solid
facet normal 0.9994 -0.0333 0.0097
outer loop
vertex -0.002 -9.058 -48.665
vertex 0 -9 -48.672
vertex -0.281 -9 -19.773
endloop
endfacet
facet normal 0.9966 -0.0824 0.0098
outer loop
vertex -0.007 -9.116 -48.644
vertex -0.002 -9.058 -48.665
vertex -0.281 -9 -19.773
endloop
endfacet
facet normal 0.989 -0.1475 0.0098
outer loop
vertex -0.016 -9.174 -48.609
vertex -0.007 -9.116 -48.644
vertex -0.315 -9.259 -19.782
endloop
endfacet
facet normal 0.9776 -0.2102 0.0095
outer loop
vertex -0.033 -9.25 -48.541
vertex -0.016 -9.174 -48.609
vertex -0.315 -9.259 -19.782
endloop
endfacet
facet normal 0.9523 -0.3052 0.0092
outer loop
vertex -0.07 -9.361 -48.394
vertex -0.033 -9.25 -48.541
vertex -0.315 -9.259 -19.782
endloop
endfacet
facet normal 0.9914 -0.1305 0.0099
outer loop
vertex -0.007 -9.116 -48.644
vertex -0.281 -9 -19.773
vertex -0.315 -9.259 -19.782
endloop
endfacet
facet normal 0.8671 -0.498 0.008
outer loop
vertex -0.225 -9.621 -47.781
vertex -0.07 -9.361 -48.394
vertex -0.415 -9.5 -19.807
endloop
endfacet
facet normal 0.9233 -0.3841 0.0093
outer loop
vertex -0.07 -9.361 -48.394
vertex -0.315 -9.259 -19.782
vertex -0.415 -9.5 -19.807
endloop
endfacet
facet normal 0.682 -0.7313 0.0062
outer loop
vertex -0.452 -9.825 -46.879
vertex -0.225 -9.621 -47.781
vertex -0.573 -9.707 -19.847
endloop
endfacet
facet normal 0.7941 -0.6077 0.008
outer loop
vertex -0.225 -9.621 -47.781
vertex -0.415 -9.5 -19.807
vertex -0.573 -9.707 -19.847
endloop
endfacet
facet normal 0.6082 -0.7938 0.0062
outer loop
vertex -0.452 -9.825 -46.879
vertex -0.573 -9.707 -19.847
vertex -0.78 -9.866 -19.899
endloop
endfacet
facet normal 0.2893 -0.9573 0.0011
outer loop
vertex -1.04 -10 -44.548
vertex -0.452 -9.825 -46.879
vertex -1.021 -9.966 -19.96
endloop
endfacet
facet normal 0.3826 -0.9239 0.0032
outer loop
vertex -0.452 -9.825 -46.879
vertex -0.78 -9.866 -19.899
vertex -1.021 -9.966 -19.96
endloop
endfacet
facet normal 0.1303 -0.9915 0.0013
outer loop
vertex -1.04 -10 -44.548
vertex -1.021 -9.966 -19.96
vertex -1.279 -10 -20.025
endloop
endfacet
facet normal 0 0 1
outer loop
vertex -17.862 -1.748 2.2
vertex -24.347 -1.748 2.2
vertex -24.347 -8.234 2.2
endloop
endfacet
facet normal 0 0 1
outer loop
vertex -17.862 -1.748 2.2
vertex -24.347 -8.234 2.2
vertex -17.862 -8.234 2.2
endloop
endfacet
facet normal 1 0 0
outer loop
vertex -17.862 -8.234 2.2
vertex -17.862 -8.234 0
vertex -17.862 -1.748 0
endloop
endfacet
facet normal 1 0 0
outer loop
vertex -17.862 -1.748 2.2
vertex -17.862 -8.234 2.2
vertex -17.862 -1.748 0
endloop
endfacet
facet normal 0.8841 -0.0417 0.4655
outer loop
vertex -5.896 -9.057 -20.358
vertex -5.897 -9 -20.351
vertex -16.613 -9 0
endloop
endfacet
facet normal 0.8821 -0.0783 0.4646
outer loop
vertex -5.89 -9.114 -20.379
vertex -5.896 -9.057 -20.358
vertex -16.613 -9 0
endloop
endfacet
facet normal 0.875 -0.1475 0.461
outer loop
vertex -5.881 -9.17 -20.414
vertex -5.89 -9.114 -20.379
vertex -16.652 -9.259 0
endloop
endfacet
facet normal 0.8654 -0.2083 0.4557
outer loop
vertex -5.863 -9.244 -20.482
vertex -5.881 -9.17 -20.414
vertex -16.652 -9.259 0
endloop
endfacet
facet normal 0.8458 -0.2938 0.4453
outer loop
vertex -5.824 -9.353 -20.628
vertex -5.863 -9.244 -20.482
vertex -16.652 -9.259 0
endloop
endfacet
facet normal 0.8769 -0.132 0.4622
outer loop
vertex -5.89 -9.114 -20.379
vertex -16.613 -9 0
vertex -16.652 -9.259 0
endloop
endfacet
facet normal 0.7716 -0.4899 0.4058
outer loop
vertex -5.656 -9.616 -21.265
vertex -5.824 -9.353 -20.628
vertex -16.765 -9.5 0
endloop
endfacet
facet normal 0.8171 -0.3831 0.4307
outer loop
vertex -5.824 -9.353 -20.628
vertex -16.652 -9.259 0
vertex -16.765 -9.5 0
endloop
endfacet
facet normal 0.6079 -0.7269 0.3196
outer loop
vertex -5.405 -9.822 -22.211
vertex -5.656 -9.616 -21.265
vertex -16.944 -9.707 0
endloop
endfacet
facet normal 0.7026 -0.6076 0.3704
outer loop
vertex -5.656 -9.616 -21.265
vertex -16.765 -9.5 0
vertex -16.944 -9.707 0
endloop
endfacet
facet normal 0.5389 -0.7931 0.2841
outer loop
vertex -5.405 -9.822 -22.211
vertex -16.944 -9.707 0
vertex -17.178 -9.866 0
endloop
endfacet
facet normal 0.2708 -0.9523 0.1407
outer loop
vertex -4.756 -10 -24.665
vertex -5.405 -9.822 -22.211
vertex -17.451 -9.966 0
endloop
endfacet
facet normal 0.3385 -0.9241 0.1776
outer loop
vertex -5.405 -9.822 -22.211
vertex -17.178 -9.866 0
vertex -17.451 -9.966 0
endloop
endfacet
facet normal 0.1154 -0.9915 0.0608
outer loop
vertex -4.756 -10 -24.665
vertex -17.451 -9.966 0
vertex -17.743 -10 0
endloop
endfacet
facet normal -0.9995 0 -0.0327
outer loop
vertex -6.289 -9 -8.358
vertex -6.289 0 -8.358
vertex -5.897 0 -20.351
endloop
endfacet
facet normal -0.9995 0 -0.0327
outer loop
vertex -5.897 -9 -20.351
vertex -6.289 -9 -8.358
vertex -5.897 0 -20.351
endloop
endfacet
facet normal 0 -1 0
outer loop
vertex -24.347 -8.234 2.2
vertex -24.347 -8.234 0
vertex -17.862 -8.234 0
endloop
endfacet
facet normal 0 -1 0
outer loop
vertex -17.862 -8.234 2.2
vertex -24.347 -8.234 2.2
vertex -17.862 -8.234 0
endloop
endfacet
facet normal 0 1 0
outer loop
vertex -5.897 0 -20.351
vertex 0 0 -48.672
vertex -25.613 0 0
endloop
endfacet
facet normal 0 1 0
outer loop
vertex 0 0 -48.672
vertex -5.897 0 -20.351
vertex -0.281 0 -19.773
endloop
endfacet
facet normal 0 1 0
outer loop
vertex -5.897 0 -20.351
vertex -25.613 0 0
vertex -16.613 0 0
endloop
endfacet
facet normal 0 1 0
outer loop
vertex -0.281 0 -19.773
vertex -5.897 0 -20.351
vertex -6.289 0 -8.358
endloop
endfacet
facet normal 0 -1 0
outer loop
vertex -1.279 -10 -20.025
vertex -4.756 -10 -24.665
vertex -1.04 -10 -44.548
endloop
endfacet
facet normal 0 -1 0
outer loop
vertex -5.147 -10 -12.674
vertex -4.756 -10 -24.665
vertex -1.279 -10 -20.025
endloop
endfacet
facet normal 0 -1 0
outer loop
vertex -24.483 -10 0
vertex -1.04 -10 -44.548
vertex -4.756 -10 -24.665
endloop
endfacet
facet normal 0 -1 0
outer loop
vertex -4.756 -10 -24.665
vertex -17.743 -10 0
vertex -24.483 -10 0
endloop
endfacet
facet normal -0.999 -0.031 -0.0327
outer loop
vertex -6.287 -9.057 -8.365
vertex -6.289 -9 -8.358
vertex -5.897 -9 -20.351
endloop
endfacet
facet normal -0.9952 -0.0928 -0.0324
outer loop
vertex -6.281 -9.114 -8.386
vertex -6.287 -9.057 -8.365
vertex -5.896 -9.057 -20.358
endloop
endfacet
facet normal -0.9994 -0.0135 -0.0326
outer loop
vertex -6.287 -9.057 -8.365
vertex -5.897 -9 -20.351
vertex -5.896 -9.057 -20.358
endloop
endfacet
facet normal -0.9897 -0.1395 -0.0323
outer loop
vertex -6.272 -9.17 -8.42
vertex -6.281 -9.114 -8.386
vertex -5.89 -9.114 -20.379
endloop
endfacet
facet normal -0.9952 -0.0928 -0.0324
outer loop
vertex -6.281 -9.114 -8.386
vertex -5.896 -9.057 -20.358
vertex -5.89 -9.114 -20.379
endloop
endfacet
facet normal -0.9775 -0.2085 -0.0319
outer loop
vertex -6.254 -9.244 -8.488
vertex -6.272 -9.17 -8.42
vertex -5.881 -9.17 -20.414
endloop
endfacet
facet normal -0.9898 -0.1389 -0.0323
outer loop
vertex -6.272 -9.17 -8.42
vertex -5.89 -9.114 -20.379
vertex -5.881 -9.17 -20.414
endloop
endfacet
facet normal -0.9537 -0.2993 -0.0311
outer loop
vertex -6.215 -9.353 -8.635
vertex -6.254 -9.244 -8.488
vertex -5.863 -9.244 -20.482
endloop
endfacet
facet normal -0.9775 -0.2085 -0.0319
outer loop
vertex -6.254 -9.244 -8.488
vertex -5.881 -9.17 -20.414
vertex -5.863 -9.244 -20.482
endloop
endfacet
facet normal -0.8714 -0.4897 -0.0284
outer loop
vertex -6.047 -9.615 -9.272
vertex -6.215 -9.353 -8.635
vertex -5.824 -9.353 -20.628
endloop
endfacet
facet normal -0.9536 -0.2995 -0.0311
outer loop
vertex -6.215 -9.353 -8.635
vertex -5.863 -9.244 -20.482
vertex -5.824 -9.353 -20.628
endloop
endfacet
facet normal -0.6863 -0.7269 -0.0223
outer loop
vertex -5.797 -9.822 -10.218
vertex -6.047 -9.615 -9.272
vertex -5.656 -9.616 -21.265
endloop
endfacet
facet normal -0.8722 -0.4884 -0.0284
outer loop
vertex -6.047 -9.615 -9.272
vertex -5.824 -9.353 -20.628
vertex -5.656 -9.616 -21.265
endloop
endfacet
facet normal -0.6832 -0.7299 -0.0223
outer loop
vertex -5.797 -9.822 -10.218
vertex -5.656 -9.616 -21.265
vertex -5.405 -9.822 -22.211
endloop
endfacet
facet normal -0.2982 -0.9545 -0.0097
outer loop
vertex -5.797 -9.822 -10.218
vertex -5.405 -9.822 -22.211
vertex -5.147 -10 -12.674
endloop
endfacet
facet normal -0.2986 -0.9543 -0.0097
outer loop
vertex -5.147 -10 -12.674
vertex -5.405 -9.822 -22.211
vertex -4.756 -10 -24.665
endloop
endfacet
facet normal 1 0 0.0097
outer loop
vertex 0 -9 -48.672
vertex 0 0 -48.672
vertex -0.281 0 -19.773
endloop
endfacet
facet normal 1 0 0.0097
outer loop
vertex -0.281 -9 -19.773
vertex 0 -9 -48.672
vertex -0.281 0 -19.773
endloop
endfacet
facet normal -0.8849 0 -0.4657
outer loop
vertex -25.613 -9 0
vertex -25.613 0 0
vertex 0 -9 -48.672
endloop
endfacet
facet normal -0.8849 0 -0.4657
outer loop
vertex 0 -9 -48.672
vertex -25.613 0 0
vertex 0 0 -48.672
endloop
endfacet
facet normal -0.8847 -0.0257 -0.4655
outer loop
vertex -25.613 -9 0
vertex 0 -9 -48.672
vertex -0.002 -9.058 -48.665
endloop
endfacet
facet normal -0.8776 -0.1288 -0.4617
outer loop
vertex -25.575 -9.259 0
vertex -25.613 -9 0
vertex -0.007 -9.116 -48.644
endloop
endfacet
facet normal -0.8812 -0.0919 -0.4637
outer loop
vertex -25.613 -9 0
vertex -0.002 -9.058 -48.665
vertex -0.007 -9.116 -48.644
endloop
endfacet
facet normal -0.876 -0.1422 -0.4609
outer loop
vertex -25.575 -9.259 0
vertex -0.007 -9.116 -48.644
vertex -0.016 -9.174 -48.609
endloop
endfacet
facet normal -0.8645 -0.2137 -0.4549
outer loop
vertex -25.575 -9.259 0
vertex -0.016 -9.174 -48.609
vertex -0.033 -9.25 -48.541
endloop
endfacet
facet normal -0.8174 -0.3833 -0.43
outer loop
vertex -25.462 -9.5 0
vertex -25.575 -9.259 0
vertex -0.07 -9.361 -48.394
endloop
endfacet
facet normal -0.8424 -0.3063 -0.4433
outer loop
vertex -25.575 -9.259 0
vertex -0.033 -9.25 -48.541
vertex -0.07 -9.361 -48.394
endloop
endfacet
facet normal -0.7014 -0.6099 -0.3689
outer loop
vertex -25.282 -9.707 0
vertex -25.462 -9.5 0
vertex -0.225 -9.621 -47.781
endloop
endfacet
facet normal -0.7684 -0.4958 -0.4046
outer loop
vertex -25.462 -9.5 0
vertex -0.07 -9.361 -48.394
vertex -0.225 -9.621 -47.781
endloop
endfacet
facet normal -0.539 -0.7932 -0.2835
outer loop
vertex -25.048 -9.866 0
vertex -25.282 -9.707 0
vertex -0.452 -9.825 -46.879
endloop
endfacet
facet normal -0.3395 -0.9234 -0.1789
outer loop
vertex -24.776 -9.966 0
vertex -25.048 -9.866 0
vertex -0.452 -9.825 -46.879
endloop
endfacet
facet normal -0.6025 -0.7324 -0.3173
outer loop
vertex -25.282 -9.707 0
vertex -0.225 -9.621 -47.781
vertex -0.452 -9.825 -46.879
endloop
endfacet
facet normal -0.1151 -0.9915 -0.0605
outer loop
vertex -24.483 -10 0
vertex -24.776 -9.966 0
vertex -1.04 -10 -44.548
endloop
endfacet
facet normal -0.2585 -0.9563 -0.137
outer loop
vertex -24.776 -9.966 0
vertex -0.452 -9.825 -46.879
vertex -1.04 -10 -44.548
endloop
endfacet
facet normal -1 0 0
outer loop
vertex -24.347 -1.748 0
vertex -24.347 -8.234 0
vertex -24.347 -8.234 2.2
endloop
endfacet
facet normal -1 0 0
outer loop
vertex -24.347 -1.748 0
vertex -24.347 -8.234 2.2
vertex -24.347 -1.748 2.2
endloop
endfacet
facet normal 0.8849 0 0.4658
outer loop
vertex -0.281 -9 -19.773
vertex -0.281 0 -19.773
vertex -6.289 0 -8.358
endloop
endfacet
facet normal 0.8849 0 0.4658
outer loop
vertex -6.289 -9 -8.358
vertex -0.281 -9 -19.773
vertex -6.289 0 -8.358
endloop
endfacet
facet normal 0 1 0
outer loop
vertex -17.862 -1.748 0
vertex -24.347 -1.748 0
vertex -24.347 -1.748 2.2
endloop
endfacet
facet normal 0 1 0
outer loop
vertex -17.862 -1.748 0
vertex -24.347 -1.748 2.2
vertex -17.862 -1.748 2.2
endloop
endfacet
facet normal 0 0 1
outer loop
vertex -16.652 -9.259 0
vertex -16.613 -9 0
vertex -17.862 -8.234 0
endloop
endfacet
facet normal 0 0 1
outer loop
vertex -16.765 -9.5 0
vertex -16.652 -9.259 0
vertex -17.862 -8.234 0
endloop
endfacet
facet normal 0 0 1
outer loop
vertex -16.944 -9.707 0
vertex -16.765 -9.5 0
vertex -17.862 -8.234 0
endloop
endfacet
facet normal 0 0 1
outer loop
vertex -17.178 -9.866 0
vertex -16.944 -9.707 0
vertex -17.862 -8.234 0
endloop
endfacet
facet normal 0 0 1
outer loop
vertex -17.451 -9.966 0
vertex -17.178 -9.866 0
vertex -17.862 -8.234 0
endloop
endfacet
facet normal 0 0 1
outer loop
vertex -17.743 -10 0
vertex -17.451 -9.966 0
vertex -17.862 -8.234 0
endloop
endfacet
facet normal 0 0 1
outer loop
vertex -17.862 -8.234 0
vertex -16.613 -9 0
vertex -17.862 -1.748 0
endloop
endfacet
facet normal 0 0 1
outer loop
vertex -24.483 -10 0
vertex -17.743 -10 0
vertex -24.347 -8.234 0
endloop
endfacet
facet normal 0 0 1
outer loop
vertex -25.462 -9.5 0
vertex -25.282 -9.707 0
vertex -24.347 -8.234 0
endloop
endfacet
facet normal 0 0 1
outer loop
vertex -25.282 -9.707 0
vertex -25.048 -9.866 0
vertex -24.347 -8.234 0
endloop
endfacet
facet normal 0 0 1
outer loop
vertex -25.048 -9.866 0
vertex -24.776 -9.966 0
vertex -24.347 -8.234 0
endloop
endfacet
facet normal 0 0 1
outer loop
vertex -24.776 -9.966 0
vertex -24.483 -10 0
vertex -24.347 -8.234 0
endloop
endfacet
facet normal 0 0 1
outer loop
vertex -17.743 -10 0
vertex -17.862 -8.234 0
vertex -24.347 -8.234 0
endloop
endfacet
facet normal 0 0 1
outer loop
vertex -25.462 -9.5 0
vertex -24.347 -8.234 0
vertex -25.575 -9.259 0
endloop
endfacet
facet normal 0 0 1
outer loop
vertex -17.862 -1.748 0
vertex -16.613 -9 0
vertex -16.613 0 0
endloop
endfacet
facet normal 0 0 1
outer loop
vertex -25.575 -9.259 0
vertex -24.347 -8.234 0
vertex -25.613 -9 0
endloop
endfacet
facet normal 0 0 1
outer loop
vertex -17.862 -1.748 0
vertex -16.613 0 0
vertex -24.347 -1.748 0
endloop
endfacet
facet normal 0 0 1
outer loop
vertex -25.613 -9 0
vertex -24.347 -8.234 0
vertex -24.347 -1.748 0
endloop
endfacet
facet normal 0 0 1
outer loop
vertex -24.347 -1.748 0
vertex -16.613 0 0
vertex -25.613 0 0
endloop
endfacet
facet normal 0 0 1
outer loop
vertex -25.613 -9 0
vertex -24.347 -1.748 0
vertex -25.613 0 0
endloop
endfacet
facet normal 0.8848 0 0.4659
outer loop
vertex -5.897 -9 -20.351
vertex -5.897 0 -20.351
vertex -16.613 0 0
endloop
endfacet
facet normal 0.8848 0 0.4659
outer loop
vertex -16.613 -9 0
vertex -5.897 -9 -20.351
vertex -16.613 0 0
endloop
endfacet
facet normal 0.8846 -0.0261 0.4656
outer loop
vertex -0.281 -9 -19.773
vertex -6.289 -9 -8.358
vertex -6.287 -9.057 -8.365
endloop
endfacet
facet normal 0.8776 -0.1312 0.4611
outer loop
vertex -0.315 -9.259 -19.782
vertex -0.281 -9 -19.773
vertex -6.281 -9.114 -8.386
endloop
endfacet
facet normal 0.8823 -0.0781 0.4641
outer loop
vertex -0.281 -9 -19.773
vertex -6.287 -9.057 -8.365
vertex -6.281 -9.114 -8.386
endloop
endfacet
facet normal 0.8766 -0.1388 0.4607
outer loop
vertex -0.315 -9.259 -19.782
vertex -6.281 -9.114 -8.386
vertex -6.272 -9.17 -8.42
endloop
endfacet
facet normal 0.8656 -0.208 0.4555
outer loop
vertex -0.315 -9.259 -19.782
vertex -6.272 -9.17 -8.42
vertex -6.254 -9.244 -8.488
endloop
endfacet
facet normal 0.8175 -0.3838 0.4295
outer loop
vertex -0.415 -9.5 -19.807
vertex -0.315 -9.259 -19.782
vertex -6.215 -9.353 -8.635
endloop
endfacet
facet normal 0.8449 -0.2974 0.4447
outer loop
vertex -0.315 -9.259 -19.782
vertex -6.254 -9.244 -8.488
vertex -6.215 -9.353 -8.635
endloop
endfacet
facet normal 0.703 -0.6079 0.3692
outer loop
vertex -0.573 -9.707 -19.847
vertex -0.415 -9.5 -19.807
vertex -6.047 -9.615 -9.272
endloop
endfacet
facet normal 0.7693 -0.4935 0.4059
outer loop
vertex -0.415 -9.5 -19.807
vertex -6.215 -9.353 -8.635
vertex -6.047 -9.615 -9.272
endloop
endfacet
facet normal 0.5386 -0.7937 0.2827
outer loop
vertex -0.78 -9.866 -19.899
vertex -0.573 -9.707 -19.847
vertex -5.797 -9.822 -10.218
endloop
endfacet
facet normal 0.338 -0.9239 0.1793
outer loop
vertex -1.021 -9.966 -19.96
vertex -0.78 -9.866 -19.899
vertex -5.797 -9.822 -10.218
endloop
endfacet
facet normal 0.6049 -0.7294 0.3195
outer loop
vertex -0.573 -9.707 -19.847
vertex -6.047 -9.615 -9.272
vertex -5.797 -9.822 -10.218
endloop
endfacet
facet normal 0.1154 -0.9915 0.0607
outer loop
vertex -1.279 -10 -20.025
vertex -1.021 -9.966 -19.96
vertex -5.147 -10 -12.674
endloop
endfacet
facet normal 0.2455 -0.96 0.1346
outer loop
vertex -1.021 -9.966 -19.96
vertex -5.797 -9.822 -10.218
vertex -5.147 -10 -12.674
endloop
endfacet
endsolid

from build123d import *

# Parameters (mm, degrees)
F1_DEPTH = 10
F2_R     = 1
F3_W     = 6.485
F3_H     = 6.485
F4_DEPTH = 2.2


with BuildPart() as f1:
    # F0 (on Front) → F1 (new body)
    with BuildSketch(Plane.XZ):
        Polygon((-16.613121, 0), (-25.613121, 0), (0, -48.672046), (-0.281218, -19.773414), (-6.288659, -8.357607), (-5.897355, -20.351225), align=None)
    extrude(amount=F1_DEPTH)

    # F2
    f2_edges = [f1.edges().sort_by_distance(p)[0] for p in [
        (-12.806561, -10, -24.336023),
        (-11.255238, -10, -10.175613),
        (-6.093007, -10, -14.354416),
        (-3.284939, -10, -14.06551),
        (-0.140609, -10, -34.22273),
    ]]
    fillet(f2_edges, radius=F2_R)

    # F3 (on face) → F4 (join)
    with BuildSketch(Plane.XY):
        with Locations((-21.104121, -4.991)):
            Rectangle(F3_W, F3_H)
    extrude(amount=F4_DEPTH)


solid = f1.part
